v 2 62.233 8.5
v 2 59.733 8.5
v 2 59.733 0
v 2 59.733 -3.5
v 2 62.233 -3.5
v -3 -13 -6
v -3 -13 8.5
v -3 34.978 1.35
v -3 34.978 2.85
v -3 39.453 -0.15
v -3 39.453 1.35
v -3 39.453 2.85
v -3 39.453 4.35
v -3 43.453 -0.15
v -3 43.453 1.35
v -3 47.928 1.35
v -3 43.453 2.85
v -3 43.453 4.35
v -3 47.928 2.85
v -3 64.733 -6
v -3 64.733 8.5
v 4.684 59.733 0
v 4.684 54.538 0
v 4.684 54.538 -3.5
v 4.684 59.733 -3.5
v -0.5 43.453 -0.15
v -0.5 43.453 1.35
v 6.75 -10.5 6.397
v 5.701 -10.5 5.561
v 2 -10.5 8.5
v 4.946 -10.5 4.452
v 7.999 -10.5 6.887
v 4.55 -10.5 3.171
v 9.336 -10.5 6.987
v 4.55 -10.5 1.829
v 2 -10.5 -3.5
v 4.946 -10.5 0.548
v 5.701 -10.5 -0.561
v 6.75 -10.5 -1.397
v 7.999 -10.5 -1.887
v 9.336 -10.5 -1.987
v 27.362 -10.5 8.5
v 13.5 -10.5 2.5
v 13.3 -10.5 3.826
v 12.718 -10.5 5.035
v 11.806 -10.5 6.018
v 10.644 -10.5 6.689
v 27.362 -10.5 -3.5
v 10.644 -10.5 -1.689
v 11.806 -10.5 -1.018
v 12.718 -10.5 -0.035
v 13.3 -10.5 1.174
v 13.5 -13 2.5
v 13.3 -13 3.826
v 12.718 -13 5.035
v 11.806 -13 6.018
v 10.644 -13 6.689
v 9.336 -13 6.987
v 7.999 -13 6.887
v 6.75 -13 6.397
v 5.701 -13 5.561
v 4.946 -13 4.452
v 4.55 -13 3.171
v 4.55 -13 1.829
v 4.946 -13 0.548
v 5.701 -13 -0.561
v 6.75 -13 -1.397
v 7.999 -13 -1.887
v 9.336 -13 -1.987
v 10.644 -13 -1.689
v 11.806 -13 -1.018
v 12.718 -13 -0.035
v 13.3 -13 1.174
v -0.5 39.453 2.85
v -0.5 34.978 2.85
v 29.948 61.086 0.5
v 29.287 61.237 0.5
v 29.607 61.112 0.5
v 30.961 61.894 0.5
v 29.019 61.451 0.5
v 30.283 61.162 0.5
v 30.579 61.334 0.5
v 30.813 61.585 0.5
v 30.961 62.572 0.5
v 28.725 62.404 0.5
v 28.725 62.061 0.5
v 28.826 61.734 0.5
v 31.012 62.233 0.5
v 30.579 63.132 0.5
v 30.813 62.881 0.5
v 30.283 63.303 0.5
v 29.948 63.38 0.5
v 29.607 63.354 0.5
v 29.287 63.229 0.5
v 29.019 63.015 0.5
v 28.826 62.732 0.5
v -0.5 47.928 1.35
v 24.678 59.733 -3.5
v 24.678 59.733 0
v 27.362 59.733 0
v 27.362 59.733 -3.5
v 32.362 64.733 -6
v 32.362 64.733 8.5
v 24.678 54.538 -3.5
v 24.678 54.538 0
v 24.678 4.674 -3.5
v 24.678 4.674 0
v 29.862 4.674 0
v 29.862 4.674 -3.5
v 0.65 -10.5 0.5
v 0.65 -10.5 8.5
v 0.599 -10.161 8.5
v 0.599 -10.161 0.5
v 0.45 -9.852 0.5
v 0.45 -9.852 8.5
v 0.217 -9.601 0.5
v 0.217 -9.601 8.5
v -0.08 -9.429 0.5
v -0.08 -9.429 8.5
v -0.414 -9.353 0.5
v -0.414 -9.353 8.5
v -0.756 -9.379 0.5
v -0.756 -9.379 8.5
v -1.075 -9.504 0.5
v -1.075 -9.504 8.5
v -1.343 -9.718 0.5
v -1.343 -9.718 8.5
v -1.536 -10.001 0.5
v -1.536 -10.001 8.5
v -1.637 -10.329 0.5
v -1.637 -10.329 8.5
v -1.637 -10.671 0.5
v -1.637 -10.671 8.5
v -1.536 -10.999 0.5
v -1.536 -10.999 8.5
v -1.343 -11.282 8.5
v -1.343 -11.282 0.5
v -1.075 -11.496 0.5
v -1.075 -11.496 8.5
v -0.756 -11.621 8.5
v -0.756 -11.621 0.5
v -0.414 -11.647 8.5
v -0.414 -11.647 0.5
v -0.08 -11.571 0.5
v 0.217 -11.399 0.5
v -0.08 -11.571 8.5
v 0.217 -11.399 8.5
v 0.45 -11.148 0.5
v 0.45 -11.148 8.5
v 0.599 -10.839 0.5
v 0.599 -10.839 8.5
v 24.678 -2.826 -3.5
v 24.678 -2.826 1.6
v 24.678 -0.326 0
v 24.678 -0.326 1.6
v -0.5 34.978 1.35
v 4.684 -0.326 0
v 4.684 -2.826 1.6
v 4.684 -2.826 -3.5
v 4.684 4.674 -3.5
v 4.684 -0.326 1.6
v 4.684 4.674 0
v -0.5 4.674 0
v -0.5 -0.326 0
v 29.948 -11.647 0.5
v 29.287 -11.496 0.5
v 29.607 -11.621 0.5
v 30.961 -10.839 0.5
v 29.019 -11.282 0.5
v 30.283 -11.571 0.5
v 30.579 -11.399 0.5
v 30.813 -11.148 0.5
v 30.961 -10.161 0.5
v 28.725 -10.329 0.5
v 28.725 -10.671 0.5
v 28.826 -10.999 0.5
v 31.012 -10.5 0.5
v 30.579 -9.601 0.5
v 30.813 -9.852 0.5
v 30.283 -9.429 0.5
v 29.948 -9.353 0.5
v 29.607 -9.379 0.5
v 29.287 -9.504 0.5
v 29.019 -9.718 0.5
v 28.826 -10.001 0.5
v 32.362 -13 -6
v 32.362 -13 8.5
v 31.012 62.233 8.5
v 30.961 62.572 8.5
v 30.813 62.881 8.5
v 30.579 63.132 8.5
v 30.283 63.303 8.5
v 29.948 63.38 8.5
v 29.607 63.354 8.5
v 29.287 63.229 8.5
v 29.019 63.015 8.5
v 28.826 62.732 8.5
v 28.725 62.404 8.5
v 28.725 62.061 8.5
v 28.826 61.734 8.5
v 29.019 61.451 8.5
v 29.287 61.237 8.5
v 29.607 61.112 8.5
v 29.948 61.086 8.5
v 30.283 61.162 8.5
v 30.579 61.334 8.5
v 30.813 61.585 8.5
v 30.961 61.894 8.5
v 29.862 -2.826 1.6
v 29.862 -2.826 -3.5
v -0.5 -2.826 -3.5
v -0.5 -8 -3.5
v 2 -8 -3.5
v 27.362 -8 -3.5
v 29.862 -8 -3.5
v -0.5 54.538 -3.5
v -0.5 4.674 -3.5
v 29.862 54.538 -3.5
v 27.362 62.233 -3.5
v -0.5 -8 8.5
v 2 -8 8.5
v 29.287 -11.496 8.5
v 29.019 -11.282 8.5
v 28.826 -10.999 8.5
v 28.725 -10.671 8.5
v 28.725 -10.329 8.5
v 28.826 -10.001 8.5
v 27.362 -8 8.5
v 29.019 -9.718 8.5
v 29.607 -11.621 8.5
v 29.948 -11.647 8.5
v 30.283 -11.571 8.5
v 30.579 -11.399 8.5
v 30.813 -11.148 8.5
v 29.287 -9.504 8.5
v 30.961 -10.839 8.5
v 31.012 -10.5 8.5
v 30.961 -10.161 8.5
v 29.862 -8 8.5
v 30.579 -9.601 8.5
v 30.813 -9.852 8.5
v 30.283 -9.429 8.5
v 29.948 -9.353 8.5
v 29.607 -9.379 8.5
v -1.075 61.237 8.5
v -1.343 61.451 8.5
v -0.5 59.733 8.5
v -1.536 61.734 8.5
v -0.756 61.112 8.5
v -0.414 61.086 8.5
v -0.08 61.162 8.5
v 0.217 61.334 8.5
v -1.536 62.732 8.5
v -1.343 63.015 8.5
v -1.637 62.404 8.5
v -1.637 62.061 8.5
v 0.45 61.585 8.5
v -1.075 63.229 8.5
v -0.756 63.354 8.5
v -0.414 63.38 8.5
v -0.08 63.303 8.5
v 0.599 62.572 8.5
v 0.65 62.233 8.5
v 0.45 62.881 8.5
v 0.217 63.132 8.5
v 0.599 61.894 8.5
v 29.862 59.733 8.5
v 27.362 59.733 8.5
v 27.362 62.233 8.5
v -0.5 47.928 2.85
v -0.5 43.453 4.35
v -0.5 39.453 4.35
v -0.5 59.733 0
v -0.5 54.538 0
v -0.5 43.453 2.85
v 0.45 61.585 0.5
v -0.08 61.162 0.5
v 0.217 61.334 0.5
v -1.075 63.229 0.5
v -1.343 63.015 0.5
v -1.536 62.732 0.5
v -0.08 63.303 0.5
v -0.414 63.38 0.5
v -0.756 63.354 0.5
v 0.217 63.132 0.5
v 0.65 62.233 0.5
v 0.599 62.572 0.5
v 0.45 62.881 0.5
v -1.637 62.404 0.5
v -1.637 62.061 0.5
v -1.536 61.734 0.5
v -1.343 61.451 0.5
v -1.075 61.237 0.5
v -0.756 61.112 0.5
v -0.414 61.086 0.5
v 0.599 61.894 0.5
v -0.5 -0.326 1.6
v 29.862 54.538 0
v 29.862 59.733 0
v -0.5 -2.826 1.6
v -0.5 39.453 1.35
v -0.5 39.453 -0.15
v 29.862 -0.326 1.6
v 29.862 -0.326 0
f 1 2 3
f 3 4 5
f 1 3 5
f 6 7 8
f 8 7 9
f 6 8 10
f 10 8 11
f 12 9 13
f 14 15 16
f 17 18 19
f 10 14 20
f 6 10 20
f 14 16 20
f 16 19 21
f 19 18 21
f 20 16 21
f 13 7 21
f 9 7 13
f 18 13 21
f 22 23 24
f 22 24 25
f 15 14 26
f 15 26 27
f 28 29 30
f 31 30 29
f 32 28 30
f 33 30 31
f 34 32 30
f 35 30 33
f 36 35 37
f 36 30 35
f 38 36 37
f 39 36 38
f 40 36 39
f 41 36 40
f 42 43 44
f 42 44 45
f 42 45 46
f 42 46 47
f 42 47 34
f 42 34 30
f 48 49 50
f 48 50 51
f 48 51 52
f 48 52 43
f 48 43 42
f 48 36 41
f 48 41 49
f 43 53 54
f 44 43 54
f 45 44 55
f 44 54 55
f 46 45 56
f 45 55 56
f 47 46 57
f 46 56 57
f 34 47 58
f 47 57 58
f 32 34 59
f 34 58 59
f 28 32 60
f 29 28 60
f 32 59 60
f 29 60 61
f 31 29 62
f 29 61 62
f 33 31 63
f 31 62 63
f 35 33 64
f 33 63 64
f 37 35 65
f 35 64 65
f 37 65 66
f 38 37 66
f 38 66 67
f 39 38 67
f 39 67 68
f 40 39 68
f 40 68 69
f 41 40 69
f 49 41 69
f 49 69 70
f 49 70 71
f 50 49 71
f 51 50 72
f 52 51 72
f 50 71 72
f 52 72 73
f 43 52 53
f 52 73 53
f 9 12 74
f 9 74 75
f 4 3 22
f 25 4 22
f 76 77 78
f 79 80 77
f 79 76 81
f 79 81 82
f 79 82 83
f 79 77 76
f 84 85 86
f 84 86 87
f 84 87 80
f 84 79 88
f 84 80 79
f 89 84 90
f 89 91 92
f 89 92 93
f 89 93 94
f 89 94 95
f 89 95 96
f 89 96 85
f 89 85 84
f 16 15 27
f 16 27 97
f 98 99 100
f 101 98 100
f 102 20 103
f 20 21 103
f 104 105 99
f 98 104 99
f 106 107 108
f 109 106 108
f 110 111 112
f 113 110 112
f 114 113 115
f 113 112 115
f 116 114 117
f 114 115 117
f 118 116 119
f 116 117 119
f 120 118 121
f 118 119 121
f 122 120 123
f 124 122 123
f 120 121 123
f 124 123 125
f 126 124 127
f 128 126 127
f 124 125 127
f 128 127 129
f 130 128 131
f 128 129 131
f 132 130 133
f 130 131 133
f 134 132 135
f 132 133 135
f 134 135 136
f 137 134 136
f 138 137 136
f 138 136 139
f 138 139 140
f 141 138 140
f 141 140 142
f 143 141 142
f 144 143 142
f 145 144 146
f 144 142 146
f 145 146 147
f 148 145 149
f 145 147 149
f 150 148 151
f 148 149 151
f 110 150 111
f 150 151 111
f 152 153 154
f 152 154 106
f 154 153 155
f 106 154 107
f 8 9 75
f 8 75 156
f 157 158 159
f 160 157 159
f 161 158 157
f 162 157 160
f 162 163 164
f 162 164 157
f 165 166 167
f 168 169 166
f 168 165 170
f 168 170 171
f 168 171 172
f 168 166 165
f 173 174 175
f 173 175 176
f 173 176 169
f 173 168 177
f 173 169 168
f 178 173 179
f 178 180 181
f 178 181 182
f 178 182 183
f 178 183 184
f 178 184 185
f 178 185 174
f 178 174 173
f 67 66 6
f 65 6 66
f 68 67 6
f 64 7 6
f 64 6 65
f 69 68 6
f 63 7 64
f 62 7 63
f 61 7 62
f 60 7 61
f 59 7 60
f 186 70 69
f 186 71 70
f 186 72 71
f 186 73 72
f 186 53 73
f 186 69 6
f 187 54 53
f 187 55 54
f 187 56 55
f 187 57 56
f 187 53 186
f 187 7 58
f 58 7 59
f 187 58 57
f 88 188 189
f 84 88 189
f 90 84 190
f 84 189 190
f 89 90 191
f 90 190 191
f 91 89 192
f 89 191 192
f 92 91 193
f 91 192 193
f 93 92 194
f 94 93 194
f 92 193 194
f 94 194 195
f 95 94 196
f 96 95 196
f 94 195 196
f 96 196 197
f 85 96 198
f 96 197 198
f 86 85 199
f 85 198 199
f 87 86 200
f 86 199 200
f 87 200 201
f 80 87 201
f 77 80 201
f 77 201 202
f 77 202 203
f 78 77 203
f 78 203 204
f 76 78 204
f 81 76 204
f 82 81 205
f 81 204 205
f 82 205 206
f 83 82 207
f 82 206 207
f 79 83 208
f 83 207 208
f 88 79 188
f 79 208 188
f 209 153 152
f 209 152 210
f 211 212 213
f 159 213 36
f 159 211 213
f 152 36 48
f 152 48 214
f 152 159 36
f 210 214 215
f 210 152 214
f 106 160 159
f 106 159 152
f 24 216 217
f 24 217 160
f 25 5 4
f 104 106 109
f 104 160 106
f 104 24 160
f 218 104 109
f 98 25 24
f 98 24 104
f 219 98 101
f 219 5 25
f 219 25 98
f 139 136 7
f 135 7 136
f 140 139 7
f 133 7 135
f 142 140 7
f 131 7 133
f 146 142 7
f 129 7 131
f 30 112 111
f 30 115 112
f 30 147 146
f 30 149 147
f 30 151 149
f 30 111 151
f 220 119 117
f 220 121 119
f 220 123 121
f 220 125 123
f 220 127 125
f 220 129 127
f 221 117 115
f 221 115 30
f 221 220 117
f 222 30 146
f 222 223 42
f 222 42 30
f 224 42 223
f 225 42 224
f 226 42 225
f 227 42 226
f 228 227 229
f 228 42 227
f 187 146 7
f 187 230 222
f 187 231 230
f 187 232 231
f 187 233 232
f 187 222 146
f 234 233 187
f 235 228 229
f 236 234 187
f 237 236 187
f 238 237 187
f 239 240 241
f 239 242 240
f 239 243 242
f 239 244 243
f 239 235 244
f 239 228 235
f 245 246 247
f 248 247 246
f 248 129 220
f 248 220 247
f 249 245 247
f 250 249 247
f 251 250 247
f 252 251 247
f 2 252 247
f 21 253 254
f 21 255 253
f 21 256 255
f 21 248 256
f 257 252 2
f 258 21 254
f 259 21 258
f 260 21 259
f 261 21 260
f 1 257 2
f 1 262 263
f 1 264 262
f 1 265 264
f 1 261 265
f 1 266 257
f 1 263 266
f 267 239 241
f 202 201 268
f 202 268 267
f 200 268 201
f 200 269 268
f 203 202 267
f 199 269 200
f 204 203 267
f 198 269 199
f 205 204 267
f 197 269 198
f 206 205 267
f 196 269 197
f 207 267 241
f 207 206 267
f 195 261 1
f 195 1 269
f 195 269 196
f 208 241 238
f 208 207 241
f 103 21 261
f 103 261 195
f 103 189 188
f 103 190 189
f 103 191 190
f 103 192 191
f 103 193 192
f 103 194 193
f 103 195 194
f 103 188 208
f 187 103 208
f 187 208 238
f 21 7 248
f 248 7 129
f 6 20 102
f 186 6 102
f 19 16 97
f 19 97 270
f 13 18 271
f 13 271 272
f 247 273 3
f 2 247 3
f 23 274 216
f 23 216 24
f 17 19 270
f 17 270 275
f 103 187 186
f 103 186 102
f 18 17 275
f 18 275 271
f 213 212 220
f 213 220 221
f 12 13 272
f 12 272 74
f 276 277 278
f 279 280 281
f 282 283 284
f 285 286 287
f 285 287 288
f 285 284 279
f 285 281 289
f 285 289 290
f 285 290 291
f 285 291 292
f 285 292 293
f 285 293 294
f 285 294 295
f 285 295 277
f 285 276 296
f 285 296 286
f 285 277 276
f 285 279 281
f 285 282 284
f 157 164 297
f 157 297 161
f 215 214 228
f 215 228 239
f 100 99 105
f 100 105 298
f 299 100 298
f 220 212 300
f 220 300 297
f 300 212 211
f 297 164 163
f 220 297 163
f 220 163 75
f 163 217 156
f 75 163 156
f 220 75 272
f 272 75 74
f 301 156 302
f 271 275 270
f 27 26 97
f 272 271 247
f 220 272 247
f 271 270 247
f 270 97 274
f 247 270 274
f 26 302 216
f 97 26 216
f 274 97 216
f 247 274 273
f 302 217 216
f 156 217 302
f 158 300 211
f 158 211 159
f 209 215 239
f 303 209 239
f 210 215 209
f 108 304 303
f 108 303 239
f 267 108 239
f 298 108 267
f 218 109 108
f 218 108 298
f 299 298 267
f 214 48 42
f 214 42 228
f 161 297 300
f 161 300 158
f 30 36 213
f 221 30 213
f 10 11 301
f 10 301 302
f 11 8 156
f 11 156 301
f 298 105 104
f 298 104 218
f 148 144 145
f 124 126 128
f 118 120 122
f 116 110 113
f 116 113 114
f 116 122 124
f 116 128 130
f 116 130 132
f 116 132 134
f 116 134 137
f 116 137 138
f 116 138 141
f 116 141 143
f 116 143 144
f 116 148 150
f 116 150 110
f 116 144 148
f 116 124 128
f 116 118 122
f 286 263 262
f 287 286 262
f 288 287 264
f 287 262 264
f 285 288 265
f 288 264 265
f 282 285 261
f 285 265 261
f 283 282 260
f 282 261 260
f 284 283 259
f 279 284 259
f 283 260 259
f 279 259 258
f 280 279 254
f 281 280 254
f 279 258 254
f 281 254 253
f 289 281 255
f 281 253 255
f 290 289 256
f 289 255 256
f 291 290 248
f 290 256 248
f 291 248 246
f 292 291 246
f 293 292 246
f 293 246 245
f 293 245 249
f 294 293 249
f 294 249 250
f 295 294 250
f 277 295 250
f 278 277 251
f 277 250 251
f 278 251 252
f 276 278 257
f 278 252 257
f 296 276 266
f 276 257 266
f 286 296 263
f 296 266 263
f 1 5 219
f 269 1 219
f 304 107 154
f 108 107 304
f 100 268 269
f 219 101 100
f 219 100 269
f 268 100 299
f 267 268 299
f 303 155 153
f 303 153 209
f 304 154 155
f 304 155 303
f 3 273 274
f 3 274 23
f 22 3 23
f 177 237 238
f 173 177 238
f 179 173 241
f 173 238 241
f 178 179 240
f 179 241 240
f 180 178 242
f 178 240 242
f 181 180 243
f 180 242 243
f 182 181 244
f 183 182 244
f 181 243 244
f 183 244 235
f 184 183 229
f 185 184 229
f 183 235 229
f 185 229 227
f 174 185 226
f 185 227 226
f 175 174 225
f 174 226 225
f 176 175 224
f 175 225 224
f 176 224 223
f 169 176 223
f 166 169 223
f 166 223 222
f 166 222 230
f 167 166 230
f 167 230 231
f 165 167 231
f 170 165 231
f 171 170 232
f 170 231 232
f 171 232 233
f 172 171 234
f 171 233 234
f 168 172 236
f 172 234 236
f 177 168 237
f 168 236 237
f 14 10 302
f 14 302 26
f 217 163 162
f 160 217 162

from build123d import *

# Parameters (mm, degrees)
SKETCH_W          = 35.3624
SKETCH_H          = 77.7328
PAD_DEPTH         = 8.5
PAD_DEPTH_BACK    = 6
SKETCH002_W       = 30.3624
SKETCH002_H       = 72.7328
POCKET_DEPTH      = 3.5
POCKET_DEPTH_BACK = 8.5
SKETCH003_W       = 5
SKETCH003_H       = 5
PAD001_DEPTH      = 8.5
PAD001_DEPTH_BACK = 3.5
SKETCH004_W       = 5.1844
SKETCH004_H       = 5.1948
SKETCH004_H_2     = 5
PAD002_DEPTH      = 3.5
SKETCH005_W       = 5.1844
SKETCH005_H       = 2.5
PAD003_DEPTH      = 1.6
PAD003_DEPTH_BACK = 3.5
SKETCH006_R       = 1.15
POCKET001_DEPTH   = 8
SKETCH007_R       = 4.5
POCKET002_DEPTH   = 2.5
POCKET003_DEPTH   = 2.5


with BuildPart() as part:
    # Sketch → Pad (new body, two sides)
    with BuildSketch(Plane.XY) as pad_sk:
        with Locations((14.6812, 25.8664)):
            Rectangle(SKETCH_W, SKETCH_H)
    extrude(amount=PAD_DEPTH)
    extrude(pad_sk.sketch, amount=-PAD_DEPTH_BACK)

    # Sketch002 → Pocket (cut, two sides)
    with BuildSketch(Plane.XY) as pocket_sk:
        with Locations((14.6812, 25.8664)):
            Rectangle(SKETCH002_W, SKETCH002_H)
    extrude(amount=-POCKET_DEPTH, mode=Mode.SUBTRACT)
    extrude(pocket_sk.sketch, amount=POCKET_DEPTH_BACK, mode=Mode.SUBTRACT)

    # Sketch003 → Pad001 (join, two sides)
    with BuildSketch(Plane.XY) as pad001_sk:
        with Locations((29.8624, -10.5)):
            Rectangle(SKETCH003_W, SKETCH003_H)
        with Locations((-0.5, -10.5)):
            Rectangle(SKETCH003_W, SKETCH003_H)
        with Locations((-0.5, 62.2328)):
            Rectangle(SKETCH003_W, SKETCH003_H)
        with Locations((29.8624, 62.2328)):
            Rectangle(SKETCH003_W, SKETCH003_H)
    extrude(amount=PAD001_DEPTH)
    extrude(pad001_sk.sketch, amount=-PAD001_DEPTH_BACK)

    # Sketch004 → Pad002 (join)
    with BuildSketch(Plane.XY):
        with Locations((2.0922, 57.1354)):
            Rectangle(SKETCH004_W, SKETCH004_H)
        with Locations((27.2702, 57.1354)):
            Rectangle(SKETCH004_W, SKETCH004_H)
        with Locations((2.0922, 2.174)):
            Rectangle(SKETCH004_W, SKETCH004_H_2)
        with Locations((27.2702, 2.174)):
            Rectangle(SKETCH004_W, SKETCH004_H_2)
    extrude(amount=-PAD002_DEPTH)

    # Sketch005 → Pad003 (join, two sides)
    with BuildSketch(Plane.XY) as pad003_sk:
        with Locations((27.2702, -1.576)):
            Rectangle(SKETCH005_W, SKETCH005_H)
        with Locations((2.0922, -1.576)):
            Rectangle(SKETCH005_W, SKETCH005_H)
    extrude(amount=PAD003_DEPTH)
    extrude(pad003_sk.sketch, amount=-PAD003_DEPTH_BACK)

    # Sketch006 (on DatumPlane) → Pocket001 (cut)
    with BuildSketch(Plane.XY.offset(8.5)):
        with Locations((29.8624, -10.5)):
            Circle(SKETCH006_R)
        with Locations((-0.5, -10.5)):
            Circle(SKETCH006_R)
        with Locations((29.8624, 62.2328)):
            Circle(SKETCH006_R)
        with Locations((-0.5, 62.2328)):
            Circle(SKETCH006_R)
    extrude(amount=-POCKET001_DEPTH, mode=Mode.SUBTRACT)

    # Sketch007 (on DatumPlane) → Pocket002 (cut)
    with BuildSketch(Plane.XZ.offset(13)):
        with Locations((9, 2.5)):
            Circle(SKETCH007_R)
    extrude(amount=-POCKET002_DEPTH, mode=Mode.SUBTRACT)

    # Sketch008 (on DatumPlane) → Pocket003 (cut)
    with BuildSketch(Plane(origin=(-3, 0, 0), x_dir=(0, -1, 0), z_dir=(-1, 0, 0))):
        Polygon((-47.9278, 2.85), (-43.4528, 2.85), (-43.4528, 4.35), (-39.4528, 4.35), (-39.4528, 2.85), (-34.9778, 2.85), (-34.9778, 1.35), (-39.4528, 1.35), (-39.4528, -0.15), (-43.4528, -0.15), (-43.4528, 1.35), (-47.9278, 1.35), align=None)
    extrude(amount=-POCKET003_DEPTH, mode=Mode.SUBTRACT)


solid = part.part
